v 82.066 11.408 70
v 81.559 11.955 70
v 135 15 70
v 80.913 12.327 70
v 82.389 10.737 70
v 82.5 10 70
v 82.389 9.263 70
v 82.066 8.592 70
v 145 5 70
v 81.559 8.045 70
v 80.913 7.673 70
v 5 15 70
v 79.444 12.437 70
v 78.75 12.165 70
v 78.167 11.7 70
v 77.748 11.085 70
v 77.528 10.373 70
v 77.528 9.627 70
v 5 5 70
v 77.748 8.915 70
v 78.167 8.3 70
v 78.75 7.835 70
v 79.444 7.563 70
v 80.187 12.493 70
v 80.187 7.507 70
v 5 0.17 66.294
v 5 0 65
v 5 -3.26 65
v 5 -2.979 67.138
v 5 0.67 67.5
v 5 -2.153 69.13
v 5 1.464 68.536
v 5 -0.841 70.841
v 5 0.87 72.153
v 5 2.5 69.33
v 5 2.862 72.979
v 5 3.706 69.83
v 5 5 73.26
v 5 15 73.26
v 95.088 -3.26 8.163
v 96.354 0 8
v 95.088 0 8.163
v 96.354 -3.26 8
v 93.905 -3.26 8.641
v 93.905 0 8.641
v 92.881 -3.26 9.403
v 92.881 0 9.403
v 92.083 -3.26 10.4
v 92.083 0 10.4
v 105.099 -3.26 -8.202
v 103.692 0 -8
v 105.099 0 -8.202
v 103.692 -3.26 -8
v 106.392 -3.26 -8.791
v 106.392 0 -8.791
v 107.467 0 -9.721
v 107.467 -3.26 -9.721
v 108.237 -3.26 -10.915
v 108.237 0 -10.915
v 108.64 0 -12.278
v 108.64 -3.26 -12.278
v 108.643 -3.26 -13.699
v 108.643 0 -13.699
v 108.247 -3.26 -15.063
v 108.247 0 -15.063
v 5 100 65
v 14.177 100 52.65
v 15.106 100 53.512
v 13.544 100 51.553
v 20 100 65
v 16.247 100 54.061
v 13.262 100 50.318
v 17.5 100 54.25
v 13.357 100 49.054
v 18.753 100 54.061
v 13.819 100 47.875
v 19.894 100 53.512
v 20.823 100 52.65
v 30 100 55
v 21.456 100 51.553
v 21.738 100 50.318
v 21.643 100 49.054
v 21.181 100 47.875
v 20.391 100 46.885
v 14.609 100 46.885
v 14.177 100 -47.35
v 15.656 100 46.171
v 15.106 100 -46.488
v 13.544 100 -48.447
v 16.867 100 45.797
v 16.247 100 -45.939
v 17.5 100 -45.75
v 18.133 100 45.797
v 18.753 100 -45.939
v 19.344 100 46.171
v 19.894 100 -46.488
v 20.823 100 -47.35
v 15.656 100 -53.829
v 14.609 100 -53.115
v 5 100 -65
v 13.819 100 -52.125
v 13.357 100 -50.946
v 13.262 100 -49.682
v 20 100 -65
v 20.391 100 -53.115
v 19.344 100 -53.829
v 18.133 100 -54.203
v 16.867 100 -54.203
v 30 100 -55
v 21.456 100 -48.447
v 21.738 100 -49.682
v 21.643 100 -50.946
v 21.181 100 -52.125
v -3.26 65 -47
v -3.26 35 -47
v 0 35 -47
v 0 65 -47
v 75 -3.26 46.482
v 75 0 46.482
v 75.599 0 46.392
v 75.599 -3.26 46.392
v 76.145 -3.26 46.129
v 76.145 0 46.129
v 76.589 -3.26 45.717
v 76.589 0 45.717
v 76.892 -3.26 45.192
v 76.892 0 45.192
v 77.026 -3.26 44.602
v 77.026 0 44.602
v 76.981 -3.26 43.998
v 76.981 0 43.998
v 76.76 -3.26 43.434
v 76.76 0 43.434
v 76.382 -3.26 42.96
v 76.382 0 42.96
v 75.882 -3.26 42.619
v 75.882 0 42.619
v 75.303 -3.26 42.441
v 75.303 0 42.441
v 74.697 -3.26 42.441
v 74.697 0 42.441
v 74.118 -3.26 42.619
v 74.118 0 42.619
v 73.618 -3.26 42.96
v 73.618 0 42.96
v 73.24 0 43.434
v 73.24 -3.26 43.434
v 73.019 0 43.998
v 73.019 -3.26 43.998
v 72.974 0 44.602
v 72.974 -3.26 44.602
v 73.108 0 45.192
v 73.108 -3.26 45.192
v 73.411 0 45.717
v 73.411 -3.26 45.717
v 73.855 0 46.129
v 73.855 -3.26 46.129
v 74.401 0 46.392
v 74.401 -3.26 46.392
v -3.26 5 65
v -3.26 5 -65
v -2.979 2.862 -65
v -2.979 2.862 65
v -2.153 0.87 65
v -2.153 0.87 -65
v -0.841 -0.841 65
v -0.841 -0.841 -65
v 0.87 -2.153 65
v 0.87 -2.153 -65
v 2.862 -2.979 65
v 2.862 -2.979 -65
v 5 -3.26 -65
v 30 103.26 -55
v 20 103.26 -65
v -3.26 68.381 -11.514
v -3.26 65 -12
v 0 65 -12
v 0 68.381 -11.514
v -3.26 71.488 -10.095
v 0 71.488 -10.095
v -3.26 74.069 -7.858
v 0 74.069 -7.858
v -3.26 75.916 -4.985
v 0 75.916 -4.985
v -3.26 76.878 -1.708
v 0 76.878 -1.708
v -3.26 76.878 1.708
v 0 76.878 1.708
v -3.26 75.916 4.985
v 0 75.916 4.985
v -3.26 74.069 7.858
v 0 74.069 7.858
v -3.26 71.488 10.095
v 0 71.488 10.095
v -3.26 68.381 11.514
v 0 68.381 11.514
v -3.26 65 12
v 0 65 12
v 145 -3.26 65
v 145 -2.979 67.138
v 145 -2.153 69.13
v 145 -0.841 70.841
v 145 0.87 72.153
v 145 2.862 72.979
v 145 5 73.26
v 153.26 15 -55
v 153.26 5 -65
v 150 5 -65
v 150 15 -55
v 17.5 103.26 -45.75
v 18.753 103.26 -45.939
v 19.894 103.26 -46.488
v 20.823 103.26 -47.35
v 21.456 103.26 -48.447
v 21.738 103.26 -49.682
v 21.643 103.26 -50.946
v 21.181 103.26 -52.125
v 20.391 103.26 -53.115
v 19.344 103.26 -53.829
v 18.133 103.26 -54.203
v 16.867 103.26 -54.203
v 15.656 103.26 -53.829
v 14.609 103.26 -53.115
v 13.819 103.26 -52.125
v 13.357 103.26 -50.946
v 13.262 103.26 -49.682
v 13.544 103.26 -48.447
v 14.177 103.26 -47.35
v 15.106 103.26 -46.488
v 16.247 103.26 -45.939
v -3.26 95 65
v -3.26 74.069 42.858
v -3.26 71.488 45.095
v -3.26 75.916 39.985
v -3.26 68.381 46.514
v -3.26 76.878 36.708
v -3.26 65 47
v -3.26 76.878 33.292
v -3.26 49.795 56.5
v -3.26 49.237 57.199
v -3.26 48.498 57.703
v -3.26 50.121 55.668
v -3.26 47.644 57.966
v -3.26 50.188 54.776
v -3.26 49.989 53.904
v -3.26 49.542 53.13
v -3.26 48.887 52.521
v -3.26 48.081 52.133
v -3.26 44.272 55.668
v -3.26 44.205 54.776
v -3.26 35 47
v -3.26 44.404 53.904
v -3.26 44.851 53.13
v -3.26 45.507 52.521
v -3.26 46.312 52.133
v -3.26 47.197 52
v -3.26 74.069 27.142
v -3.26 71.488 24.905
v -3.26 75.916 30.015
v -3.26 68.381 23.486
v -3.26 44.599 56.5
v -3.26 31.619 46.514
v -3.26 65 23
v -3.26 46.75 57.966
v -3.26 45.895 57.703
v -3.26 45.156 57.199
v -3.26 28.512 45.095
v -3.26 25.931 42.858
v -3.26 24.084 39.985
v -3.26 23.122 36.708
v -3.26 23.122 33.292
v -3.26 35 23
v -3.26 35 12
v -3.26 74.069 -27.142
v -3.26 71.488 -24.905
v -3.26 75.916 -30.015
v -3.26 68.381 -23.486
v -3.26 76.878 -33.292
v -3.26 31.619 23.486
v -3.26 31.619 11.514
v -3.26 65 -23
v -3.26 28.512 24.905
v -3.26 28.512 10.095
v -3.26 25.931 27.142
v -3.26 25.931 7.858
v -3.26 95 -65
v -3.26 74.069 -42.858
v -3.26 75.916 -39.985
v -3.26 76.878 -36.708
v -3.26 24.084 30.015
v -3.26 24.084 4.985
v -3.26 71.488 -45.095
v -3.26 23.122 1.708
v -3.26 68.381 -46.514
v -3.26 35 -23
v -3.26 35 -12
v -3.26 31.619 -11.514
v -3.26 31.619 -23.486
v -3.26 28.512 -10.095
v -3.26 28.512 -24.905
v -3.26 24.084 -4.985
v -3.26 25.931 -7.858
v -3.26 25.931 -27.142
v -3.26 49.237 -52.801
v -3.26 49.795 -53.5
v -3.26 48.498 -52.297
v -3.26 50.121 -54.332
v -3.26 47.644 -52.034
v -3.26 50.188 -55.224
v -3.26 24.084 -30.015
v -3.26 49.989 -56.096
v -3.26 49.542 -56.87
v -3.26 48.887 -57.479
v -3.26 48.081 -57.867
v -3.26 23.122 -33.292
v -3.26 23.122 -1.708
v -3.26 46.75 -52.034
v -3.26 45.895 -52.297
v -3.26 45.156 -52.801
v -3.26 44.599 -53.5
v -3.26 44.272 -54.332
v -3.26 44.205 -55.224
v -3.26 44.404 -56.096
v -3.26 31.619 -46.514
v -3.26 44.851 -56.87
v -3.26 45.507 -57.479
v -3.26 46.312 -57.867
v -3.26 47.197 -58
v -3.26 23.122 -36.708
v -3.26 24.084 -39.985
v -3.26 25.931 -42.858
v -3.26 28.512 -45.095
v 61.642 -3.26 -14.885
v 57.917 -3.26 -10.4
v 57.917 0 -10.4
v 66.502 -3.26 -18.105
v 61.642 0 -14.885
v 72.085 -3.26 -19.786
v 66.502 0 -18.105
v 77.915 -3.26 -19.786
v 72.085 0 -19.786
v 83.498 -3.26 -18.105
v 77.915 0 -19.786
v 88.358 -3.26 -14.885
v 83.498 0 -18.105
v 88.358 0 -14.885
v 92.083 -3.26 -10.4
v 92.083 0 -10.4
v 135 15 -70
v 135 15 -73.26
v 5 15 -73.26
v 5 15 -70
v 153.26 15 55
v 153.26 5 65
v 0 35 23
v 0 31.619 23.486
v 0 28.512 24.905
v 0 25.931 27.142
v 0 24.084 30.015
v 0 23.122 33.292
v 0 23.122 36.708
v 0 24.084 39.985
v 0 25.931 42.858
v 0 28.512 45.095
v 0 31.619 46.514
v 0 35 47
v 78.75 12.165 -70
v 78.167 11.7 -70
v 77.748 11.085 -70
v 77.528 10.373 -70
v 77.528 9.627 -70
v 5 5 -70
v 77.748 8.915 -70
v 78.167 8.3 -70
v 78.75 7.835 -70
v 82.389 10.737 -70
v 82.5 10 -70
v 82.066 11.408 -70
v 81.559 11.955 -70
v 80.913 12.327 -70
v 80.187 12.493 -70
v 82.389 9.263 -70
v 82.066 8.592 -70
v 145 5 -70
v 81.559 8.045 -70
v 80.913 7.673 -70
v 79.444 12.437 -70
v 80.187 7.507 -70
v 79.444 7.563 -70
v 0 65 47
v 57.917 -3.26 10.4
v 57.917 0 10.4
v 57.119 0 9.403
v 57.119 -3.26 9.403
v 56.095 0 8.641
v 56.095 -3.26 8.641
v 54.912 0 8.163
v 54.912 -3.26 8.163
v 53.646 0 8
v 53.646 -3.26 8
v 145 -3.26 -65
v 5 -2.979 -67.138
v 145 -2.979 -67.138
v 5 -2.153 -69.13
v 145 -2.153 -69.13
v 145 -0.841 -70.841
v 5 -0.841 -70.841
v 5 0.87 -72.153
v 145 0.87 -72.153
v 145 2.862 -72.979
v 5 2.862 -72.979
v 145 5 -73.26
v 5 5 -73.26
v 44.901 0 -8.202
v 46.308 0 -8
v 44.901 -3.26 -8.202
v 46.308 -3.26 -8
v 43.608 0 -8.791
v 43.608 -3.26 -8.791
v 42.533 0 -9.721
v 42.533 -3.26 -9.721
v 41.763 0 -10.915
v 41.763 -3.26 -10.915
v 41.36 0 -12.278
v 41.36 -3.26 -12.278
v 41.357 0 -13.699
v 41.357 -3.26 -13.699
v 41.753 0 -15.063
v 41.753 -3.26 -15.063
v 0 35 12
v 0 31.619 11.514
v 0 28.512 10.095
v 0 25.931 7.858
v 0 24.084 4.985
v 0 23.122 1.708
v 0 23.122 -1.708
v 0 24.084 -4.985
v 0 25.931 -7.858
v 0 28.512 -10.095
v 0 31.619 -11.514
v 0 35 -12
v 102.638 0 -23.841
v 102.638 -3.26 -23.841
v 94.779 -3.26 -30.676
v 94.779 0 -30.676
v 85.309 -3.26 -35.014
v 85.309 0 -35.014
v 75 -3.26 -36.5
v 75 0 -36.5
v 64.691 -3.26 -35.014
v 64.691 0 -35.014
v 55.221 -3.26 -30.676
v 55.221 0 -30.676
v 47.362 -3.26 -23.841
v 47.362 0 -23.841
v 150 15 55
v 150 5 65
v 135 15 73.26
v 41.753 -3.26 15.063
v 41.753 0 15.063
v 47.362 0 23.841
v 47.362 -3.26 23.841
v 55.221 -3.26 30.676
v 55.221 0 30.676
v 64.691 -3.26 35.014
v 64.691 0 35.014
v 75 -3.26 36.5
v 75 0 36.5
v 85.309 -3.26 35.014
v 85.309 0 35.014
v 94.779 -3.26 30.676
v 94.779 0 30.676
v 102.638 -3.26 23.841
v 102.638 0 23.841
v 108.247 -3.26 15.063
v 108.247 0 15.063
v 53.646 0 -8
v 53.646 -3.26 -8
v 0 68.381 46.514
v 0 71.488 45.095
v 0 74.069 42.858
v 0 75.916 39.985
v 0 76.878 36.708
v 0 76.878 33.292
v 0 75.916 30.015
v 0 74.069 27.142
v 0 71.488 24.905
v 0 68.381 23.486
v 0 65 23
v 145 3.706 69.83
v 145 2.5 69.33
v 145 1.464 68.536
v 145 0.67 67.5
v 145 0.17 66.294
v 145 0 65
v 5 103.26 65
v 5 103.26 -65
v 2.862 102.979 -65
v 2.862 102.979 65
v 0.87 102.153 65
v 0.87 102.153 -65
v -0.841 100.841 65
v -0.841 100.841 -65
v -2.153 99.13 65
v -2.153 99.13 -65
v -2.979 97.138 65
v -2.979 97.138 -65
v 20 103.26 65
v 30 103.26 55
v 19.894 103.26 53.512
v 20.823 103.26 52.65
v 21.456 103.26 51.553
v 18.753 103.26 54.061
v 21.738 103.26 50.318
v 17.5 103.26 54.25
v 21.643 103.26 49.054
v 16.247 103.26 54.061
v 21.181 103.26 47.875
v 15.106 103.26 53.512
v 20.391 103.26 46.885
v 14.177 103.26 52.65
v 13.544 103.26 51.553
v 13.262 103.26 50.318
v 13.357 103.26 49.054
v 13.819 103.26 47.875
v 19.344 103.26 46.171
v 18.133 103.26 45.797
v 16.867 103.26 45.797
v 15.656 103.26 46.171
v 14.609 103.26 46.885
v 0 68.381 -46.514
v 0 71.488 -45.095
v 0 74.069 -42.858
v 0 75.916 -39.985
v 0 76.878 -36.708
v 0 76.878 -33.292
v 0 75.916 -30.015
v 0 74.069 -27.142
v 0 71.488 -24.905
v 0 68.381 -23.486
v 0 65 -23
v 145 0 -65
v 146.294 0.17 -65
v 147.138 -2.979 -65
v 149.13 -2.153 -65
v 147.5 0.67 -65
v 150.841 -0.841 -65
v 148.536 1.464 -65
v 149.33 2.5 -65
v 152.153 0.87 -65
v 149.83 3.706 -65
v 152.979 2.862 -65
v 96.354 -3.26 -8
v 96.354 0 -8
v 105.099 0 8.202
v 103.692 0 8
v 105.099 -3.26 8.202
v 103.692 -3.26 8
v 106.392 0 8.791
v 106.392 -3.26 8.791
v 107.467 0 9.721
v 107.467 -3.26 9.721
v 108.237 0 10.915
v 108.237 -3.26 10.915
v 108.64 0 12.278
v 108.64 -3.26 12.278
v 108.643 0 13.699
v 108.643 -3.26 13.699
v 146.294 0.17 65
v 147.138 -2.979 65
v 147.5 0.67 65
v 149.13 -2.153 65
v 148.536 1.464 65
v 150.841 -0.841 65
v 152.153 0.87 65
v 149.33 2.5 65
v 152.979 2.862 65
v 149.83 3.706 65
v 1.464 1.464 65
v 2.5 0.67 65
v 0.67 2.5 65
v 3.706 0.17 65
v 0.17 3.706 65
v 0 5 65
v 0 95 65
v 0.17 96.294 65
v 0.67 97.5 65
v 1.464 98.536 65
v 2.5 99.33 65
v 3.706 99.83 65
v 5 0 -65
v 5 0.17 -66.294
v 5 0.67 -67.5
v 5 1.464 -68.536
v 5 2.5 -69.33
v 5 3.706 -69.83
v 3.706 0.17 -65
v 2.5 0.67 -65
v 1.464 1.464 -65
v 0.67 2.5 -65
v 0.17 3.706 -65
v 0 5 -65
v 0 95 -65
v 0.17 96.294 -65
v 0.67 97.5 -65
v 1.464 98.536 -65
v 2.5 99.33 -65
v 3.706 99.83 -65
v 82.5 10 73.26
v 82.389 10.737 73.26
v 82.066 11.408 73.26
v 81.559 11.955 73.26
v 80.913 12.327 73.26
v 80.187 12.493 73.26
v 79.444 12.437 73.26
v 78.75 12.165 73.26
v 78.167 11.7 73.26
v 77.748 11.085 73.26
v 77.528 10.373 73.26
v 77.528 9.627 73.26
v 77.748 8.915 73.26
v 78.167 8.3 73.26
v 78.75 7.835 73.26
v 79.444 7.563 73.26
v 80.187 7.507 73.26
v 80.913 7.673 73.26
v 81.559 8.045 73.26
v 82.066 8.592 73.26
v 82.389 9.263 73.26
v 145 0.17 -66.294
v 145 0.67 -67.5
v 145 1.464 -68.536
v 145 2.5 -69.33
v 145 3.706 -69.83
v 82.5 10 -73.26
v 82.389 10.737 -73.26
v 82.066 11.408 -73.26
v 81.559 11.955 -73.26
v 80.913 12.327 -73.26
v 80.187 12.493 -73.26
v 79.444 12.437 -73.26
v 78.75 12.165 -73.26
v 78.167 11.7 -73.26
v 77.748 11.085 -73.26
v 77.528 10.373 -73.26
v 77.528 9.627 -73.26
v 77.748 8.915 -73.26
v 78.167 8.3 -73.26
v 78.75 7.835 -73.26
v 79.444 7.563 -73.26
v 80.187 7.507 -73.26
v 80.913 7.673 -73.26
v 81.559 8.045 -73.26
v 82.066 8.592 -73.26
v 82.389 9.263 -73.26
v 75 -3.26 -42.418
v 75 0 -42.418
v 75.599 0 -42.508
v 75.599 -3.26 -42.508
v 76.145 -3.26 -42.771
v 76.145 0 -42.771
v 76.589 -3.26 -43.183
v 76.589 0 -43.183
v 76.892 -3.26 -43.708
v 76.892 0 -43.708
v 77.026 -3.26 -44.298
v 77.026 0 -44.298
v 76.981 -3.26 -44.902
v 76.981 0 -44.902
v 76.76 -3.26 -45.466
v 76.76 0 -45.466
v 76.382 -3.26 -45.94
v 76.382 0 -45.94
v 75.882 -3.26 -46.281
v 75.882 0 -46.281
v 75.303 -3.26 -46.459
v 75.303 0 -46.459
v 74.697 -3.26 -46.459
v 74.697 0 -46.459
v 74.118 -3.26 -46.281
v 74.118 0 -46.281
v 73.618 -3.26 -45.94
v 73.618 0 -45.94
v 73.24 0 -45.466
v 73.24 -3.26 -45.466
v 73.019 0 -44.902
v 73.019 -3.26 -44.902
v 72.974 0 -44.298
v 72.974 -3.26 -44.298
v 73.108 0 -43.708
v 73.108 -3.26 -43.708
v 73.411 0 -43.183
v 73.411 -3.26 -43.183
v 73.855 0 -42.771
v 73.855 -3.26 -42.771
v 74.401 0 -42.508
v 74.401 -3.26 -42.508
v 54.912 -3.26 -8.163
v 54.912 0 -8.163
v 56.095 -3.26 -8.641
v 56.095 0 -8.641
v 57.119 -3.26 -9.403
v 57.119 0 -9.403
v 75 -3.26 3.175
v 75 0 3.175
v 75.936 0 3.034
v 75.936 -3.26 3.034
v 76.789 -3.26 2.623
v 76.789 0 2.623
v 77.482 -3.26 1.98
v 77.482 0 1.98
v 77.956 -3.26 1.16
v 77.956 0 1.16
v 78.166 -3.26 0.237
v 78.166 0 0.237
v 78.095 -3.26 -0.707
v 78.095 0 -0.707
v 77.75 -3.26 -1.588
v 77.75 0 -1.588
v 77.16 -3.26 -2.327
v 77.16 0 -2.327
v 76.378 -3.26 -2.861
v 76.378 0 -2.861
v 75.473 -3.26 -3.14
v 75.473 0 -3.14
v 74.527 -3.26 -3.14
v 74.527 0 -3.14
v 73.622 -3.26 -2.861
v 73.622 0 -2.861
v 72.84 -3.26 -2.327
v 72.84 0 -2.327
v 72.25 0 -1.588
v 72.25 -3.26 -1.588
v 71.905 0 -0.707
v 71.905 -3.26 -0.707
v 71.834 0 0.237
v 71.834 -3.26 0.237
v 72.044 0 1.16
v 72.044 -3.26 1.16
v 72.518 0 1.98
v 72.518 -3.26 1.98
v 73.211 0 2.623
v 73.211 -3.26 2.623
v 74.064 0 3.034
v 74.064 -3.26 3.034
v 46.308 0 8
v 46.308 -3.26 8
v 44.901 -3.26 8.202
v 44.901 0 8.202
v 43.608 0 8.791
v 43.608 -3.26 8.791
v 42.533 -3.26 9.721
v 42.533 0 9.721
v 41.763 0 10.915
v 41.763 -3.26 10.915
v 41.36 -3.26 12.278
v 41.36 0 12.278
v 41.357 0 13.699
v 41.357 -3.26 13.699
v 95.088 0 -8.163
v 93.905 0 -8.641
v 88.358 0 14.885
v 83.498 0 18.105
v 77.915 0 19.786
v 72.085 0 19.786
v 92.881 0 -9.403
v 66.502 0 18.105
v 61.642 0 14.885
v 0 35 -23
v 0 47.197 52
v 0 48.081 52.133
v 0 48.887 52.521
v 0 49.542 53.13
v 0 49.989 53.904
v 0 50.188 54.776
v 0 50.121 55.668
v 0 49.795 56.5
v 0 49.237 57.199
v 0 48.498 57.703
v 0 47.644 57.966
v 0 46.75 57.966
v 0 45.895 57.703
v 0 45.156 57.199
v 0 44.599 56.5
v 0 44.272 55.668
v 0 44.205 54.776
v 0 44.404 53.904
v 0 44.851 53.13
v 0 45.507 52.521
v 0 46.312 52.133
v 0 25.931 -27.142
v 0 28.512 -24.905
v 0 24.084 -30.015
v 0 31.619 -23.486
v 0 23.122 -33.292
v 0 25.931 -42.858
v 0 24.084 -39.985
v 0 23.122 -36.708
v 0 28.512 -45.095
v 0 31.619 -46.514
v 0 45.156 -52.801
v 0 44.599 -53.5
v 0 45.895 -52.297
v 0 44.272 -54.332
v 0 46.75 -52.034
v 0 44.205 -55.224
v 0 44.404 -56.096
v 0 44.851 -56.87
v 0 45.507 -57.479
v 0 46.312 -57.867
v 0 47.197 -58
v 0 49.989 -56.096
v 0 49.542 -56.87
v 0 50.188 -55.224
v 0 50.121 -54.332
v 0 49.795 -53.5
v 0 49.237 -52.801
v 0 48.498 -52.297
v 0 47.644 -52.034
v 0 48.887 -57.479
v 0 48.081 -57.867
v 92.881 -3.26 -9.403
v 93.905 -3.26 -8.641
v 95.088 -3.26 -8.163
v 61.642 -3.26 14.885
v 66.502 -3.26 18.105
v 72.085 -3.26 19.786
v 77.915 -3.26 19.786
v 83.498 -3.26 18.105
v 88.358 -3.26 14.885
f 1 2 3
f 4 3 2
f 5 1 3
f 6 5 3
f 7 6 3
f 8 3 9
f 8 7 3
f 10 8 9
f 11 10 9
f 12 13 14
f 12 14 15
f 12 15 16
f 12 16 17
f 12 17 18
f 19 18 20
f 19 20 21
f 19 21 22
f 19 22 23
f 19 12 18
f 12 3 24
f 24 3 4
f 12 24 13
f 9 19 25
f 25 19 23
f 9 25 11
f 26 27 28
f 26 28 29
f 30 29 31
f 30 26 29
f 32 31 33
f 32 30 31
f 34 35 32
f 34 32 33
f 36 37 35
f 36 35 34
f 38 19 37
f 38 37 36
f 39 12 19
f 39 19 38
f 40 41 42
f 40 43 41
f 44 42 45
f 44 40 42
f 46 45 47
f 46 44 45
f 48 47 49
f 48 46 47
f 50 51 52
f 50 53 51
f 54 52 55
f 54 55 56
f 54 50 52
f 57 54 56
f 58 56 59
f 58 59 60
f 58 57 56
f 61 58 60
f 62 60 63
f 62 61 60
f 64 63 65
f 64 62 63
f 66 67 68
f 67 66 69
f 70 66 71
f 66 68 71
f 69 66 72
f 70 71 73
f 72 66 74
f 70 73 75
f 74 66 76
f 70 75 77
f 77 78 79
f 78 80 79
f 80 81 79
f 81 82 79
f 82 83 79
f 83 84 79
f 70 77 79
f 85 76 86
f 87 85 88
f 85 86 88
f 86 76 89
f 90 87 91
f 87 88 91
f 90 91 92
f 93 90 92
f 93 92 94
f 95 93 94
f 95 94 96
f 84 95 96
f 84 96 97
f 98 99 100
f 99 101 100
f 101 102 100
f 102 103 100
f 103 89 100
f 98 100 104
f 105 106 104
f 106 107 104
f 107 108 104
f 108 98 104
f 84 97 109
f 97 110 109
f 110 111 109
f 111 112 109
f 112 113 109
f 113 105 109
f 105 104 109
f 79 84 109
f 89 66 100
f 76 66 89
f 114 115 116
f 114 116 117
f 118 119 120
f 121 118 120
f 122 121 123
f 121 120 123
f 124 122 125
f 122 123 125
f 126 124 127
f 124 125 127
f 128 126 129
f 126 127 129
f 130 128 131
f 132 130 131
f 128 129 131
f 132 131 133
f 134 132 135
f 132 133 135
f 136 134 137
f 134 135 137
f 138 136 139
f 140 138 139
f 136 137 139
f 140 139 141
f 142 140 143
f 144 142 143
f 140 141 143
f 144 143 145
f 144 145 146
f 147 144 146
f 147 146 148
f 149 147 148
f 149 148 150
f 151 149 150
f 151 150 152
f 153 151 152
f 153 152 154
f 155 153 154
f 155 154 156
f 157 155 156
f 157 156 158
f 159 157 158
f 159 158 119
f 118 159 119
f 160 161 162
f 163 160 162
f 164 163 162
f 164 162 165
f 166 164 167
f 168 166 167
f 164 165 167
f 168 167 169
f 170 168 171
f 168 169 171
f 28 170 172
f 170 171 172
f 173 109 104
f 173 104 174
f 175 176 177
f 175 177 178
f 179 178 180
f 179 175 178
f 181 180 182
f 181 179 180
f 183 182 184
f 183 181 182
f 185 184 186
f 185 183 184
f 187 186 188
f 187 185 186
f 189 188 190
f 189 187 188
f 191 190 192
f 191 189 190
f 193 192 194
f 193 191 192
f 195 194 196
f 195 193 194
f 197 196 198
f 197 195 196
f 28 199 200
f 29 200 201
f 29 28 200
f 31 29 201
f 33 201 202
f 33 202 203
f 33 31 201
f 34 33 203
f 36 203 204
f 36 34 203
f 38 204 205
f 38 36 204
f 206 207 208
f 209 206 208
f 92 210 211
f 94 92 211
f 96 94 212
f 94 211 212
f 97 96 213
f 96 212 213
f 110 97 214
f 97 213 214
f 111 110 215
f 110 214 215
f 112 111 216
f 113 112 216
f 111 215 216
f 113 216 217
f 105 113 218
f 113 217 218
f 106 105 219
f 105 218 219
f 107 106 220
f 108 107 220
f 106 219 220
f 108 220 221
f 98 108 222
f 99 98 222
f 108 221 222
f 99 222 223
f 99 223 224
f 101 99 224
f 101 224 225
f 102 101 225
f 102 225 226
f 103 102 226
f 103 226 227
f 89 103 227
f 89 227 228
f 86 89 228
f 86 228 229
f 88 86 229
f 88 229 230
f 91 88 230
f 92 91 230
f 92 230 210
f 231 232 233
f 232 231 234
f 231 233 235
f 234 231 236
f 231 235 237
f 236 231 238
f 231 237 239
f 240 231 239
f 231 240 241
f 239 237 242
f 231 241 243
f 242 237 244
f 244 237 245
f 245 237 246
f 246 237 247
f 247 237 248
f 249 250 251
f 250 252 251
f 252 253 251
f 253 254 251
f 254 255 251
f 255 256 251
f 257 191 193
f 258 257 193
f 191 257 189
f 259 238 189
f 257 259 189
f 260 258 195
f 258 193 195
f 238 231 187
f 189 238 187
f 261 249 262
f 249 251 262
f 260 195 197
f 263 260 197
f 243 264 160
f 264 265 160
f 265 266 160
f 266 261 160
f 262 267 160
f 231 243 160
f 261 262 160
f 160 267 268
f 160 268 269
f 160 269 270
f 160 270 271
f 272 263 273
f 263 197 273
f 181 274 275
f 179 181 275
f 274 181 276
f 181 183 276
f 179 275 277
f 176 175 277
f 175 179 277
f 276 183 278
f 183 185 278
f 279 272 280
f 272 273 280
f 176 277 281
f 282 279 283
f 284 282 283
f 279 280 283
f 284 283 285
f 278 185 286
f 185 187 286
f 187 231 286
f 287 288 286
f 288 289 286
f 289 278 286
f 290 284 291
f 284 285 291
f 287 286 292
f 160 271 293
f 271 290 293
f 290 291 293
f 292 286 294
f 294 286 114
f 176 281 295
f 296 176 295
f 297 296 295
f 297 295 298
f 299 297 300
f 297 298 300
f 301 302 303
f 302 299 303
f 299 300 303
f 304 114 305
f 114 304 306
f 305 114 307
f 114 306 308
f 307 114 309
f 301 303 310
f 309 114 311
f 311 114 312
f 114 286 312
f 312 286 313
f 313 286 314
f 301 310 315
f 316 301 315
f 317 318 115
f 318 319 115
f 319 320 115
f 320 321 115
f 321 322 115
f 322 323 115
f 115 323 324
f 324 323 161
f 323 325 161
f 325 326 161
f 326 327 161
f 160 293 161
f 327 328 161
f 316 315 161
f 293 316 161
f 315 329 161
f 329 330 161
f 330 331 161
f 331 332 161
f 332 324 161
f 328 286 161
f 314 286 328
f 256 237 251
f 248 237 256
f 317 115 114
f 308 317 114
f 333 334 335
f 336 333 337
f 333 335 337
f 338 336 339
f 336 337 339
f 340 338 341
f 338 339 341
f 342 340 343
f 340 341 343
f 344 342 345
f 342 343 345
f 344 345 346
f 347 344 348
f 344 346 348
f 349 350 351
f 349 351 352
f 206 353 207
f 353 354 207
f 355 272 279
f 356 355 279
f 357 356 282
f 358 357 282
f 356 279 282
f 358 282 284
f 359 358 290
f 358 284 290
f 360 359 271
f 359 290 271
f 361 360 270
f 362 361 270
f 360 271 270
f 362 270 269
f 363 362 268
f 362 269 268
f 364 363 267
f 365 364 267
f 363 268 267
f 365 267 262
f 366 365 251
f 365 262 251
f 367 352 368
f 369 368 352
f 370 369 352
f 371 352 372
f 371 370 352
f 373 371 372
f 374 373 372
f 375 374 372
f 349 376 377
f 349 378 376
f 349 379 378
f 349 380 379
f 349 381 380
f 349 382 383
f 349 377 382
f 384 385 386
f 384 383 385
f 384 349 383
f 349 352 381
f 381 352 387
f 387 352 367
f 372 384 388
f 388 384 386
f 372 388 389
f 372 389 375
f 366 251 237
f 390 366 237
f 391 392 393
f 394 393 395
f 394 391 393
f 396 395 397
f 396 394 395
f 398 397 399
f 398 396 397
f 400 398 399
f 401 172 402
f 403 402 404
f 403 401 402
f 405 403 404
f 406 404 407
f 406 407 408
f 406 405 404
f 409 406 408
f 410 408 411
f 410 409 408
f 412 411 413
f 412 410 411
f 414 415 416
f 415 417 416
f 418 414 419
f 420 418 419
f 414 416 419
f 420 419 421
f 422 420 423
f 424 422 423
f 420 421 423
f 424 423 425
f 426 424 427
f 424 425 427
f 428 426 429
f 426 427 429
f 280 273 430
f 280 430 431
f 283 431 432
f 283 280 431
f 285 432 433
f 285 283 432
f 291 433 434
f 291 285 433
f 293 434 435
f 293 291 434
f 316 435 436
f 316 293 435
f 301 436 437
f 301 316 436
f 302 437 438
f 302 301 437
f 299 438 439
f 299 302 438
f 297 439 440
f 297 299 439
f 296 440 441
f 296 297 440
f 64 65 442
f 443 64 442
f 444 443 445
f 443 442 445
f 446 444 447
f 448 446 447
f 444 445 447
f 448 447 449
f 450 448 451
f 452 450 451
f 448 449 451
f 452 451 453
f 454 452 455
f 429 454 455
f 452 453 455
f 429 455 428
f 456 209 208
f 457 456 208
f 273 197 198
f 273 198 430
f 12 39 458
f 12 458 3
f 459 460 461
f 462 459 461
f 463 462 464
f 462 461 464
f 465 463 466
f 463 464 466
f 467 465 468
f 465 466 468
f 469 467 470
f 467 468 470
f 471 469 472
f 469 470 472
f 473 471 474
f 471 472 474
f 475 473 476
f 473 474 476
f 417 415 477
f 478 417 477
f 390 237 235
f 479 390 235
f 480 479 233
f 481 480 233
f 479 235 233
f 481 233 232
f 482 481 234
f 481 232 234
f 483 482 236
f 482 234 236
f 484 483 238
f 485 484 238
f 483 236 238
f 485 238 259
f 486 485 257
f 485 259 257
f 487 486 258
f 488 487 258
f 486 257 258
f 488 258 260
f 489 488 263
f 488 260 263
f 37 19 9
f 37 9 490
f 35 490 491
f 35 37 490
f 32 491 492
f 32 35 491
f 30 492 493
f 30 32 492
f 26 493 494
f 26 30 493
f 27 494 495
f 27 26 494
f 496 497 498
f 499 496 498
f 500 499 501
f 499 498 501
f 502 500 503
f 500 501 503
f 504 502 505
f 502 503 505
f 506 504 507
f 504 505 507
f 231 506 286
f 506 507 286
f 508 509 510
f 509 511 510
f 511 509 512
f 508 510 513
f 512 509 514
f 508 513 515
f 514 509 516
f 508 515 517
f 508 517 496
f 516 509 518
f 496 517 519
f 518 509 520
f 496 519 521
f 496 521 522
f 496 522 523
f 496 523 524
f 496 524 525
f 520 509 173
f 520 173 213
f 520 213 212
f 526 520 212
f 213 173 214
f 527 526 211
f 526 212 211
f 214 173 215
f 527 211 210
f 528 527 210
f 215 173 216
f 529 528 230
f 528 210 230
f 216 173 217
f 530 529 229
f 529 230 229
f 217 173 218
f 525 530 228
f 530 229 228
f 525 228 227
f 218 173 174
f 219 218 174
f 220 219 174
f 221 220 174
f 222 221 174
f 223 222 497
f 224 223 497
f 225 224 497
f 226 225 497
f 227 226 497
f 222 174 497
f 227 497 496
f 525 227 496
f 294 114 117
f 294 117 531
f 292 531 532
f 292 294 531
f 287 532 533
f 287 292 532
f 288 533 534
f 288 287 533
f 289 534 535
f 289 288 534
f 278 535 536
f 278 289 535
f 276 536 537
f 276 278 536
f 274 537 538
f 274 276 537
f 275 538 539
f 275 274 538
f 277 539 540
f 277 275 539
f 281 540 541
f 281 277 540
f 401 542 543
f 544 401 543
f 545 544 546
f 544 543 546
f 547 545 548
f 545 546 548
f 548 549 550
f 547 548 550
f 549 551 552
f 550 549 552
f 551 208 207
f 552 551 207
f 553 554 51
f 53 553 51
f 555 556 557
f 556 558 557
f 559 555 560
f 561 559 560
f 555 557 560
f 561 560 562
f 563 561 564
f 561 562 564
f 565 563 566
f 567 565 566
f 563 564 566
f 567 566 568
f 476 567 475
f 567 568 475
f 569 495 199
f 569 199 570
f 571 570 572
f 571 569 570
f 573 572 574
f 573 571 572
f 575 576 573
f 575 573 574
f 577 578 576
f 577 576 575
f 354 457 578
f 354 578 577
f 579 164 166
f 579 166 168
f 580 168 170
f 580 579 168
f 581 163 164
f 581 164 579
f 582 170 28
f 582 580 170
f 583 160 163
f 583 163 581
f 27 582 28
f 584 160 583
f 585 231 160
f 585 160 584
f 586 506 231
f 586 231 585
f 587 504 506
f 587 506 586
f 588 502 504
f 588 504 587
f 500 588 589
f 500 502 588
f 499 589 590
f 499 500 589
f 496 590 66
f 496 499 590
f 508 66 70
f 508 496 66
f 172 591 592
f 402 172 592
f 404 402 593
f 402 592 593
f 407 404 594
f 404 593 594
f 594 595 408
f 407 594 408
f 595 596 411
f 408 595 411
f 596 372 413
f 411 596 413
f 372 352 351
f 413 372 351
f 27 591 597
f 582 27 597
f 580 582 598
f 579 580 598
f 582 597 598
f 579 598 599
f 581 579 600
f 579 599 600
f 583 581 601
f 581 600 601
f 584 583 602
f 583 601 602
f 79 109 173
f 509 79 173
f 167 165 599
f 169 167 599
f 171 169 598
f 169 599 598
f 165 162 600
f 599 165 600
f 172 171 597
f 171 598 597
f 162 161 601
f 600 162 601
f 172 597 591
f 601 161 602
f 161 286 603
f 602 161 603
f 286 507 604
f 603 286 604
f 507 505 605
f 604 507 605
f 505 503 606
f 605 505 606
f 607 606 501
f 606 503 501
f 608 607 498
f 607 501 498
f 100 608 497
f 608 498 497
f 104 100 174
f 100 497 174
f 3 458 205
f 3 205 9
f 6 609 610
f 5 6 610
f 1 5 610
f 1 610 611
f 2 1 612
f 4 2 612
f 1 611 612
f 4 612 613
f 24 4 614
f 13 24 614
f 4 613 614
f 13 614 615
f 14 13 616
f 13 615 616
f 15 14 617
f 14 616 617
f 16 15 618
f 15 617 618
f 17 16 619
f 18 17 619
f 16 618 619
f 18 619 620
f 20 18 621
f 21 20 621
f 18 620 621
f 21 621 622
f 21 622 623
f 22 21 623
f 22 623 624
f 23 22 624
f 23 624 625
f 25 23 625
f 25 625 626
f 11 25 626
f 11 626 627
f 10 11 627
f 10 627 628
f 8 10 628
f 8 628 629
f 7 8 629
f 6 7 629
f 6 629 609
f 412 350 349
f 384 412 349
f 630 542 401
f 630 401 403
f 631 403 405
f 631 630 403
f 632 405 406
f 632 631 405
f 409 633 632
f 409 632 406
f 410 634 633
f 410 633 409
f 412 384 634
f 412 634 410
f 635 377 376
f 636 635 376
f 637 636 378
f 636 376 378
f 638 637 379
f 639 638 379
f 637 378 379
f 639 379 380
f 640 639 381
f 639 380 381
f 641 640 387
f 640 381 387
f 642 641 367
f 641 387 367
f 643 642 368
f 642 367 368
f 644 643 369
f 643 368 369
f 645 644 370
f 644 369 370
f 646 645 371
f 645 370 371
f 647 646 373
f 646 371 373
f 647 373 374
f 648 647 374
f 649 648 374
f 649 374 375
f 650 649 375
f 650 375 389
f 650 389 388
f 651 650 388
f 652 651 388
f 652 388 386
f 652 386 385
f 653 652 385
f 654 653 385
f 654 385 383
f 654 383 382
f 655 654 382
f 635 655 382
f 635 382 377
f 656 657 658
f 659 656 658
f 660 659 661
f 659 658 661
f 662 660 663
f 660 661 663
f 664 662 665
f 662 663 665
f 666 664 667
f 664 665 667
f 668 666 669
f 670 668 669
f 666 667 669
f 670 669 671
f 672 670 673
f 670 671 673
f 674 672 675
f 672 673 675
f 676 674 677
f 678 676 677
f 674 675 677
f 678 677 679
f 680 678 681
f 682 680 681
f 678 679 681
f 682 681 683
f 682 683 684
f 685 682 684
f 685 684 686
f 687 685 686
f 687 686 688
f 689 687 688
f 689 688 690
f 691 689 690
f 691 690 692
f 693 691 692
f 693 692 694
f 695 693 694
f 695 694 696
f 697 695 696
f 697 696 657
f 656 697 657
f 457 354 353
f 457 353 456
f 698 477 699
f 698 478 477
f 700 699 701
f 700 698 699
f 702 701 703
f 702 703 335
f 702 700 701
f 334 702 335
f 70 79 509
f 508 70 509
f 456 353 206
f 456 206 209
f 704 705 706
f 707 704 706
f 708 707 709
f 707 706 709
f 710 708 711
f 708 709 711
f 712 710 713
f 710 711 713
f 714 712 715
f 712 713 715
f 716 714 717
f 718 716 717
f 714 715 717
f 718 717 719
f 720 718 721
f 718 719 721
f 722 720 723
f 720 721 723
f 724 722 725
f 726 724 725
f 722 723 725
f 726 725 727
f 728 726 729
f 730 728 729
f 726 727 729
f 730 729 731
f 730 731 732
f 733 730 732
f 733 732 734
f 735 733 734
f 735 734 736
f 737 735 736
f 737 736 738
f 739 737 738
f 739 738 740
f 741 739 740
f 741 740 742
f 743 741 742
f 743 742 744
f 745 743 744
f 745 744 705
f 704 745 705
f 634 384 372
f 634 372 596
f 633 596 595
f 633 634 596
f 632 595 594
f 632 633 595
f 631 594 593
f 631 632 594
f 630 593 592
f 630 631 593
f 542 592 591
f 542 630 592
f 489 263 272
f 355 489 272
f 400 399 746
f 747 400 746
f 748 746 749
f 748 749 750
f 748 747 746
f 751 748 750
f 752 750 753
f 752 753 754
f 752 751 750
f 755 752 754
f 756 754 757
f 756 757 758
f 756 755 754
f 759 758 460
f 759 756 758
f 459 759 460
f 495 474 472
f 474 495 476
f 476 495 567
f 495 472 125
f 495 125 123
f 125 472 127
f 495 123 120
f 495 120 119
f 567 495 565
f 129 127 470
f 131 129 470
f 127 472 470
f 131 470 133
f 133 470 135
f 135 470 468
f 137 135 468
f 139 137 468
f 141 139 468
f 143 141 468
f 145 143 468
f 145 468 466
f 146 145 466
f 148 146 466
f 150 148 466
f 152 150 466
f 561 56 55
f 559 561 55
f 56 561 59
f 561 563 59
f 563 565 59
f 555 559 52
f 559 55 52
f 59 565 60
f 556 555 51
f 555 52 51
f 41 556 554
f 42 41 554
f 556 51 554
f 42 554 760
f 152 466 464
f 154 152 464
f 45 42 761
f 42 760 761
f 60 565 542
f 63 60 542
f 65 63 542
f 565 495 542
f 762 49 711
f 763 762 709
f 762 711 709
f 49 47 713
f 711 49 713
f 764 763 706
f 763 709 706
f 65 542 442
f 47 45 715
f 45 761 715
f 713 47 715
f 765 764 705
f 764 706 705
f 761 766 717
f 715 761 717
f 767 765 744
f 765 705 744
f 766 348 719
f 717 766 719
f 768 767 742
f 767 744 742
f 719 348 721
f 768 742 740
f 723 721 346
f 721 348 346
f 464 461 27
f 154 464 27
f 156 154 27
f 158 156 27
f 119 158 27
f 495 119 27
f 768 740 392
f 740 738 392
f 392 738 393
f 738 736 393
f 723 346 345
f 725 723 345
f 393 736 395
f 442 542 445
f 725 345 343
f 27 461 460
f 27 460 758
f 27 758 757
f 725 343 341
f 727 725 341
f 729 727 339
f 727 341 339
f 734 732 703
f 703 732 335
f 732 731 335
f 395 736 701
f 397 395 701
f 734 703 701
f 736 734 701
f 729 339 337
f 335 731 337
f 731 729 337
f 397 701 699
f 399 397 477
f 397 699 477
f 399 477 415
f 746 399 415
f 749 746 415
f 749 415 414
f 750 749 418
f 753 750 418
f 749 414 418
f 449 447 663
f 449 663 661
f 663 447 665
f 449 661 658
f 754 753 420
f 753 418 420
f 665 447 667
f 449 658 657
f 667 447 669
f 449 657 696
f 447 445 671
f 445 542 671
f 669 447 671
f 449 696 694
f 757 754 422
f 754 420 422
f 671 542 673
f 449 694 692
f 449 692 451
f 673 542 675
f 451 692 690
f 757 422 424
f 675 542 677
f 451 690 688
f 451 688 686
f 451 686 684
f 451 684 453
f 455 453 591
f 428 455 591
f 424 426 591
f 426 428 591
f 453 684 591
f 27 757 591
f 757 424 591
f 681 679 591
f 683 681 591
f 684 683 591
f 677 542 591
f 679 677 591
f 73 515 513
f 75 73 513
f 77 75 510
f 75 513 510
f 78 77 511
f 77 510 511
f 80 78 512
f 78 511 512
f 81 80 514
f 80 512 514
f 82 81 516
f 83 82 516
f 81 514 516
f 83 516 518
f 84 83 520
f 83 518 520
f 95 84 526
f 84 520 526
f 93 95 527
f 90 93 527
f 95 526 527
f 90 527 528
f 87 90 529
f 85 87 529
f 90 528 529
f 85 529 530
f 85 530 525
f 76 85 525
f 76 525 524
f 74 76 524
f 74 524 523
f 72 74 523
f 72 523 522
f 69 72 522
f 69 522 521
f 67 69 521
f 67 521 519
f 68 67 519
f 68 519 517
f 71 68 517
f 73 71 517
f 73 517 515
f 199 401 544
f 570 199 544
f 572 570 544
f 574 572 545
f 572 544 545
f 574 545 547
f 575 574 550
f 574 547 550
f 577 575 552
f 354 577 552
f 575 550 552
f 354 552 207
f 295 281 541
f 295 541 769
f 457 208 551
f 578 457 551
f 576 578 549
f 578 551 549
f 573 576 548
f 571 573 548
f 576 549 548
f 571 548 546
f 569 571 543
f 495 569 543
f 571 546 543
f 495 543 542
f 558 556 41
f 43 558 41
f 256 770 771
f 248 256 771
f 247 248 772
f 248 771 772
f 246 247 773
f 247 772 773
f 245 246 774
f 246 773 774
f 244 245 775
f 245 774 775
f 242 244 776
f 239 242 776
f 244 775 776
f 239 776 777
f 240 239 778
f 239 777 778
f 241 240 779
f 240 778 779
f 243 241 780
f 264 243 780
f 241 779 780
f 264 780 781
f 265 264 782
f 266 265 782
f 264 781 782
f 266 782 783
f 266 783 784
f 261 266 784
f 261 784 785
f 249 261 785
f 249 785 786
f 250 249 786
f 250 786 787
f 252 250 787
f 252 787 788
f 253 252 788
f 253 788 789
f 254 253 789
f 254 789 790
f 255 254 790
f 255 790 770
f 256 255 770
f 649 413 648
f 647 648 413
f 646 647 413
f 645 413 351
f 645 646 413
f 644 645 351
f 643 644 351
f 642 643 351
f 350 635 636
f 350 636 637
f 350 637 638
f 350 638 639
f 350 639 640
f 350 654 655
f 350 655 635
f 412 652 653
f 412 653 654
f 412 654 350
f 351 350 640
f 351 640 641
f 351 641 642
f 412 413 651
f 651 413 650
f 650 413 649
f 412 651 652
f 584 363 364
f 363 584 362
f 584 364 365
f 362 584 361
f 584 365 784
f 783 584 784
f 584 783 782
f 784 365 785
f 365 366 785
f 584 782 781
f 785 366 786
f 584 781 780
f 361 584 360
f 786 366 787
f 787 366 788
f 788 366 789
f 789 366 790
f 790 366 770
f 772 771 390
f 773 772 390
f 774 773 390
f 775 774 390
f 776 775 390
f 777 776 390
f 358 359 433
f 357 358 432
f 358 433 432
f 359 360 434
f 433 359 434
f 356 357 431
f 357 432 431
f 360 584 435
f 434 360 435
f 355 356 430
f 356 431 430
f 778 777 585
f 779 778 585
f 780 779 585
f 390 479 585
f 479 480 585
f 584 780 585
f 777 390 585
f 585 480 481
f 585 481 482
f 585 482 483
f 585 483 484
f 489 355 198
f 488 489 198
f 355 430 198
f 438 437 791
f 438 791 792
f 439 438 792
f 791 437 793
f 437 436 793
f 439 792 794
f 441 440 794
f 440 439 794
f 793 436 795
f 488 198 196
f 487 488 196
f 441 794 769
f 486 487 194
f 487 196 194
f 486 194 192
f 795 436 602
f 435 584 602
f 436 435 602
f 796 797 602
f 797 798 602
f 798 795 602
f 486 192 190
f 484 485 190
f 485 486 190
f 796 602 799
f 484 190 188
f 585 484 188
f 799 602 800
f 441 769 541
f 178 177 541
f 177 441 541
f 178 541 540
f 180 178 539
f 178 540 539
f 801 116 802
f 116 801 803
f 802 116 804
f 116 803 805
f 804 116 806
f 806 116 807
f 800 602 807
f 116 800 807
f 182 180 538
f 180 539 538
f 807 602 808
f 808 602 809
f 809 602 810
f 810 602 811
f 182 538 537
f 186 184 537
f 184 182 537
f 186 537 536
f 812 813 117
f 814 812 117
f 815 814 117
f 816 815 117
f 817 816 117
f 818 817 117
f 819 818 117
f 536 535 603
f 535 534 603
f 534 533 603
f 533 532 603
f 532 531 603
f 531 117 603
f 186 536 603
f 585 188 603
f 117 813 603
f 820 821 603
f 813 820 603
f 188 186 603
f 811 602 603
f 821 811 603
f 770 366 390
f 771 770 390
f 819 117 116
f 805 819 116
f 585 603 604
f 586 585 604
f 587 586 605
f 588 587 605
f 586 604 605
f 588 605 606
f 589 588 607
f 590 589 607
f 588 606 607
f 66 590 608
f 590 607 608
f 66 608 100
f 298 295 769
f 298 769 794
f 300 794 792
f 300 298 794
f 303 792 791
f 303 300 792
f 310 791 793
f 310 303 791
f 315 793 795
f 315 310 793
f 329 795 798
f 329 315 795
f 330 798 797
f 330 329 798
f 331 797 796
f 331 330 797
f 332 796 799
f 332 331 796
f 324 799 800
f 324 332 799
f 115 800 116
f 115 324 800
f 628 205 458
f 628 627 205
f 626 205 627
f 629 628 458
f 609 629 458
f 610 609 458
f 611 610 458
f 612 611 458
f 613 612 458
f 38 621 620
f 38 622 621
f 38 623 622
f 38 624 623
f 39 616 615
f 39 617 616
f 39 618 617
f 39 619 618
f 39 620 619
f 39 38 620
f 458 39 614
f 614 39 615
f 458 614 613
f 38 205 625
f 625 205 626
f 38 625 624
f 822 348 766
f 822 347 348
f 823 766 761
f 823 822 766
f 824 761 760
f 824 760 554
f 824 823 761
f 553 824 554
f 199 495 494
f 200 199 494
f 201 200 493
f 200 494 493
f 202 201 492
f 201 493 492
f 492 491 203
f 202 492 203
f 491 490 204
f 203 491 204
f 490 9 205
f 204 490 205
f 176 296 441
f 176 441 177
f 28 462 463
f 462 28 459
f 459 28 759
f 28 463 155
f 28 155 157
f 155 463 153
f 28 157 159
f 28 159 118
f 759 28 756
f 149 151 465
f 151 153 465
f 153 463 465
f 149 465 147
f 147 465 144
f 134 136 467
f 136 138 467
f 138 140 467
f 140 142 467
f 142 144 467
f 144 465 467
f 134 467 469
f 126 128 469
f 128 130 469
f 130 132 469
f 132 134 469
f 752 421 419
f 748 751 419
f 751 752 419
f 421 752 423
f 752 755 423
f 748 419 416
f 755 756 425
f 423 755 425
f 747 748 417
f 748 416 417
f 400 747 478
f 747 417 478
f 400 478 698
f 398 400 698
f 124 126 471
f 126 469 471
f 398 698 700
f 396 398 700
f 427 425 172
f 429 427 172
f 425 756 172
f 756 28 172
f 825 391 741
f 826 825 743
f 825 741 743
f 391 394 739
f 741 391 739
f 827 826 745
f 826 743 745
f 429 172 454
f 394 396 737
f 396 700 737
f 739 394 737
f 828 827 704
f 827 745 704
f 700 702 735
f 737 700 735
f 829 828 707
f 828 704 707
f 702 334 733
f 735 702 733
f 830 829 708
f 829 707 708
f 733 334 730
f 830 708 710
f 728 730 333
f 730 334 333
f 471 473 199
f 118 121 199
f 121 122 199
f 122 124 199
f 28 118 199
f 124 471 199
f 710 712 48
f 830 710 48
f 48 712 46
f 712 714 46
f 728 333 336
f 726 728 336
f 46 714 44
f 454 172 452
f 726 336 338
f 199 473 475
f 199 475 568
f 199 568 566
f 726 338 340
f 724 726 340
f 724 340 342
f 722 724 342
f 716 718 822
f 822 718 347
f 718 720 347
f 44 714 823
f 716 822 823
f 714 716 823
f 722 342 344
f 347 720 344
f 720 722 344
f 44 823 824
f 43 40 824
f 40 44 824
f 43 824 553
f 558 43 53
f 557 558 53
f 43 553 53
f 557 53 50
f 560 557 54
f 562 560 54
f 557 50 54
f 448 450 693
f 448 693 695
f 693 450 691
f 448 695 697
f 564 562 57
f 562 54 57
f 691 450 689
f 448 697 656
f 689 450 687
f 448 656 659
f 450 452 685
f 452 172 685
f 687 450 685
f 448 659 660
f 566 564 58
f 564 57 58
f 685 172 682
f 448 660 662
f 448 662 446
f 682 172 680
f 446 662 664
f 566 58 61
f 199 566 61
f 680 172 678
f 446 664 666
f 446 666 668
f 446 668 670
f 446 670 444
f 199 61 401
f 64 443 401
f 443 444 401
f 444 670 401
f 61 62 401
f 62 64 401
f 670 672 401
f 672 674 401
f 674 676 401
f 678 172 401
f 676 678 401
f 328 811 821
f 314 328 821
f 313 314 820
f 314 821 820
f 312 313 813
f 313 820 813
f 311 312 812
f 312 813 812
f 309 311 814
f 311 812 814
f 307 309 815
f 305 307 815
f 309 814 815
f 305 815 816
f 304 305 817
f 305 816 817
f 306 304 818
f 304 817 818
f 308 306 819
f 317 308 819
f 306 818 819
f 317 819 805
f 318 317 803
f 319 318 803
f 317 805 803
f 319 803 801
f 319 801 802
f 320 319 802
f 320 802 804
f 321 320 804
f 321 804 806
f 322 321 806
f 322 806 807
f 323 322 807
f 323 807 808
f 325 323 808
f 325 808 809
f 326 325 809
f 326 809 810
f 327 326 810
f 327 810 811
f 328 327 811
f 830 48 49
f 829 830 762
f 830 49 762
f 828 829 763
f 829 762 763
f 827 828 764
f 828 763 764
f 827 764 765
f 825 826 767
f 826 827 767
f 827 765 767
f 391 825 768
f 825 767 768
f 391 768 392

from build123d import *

# Parameters (mm, degrees)
BASE_FLANGE1_START      = -65
BASE_FLANGE1_DEPTH      = 130
CUT_EXTRUDE1_DEPTH      = 10
SKETCH4_R               = 4.25
CUT_EXTRUDE2_DEPTH      = 10
SKETCH5_R               = 3.175
SKETCH5_R_2             = 2.032
CUT_EXTRUDE3_DEPTH      = 10
CUT_EXTRUDE4_DEPTH      = 10
CHAMFER1_SIZE           = 10
EDGE_FLANGE1_DEPTH      = 140
EDGE_FLANGE1_BEND_DEPTH = 140
FILLET1_R               = 5
CHAMFER2_SIZE           = 10
SKETCH13_R              = 3
CUT_EXTRUDE5_DEPTH      = 10
SKETCH14_R              = 2.5
CUT_EXTRUDE6_DEPTH      = 236.837583095


# Read off the part's stored shape, not the designer's step: Base-Flange1
# Sheet-metal steps are written as plain solids
with BuildPart() as part:
    # Base-Flange1 outline → Base-Flange1 (new body)
    with BuildSketch(Plane.XY.offset(BASE_FLANGE1_START)):
        with BuildLine():
            Line((153.26, 5), (153.26, 15))
            Line((153.26, 15), (150, 15))
            Line((150, 15), (150, 5))
            ThreePointArc((150, 5), (148.535533906, 1.464466094), (145, 0))
            Line((145, 0), (5, 0))
            ThreePointArc((5, 0), (1.464466094, 1.464466094), (0, 5))
            Line((0, 5), (0, 95))
            ThreePointArc((0, 95), (1.464466094, 98.535533906), (5, 100))
            Line((5, 100), (30, 100))
            Line((30, 100), (30, 103.26))
            Line((30, 103.26), (5, 103.26))
            ThreePointArc((5, 103.26), (-0.840702013, 100.840702013), (-3.26, 95))
            Line((-3.26, 95), (-3.26, 5))
            ThreePointArc((-3.26, 5), (-0.840702013, -0.840702013), (5, -3.26))
            Line((5, -3.26), (145, -3.26))
            ThreePointArc((145, -3.26), (150.840702013, -0.840702013), (153.26, 5))
        make_face()
    extrude(amount=BASE_FLANGE1_DEPTH)

    # Sketch3 → Cut-Extrude1 (cut)
    with BuildSketch(Plane.ZY.offset(3.26)):
        with BuildLine():
            Line((-47, 35), (-47, 65))
            ThreePointArc((-47, 65), (-35, 77), (-23, 65))
            Line((-23, 65), (-23, 35))
            ThreePointArc((-23, 35), (-35, 23), (-47, 35))
        make_face()
        with BuildLine():
            Line((47, 35), (47, 65))
            ThreePointArc((47, 65), (35, 77), (23, 65))
            Line((23, 65), (23, 35))
            ThreePointArc((23, 35), (35, 23), (47, 35))
        make_face()
        with BuildLine():
            Line((12, 65), (12, 35))
            ThreePointArc((12, 35), (0, 23), (-12, 35))
            Line((-12, 35), (-12, 65))
            ThreePointArc((-12, 65), (0, 77), (12, 65))
        make_face()
    extrude(amount=-CUT_EXTRUDE1_DEPTH, mode=Mode.SUBTRACT)

    # Sketch4 → Cut-Extrude2 (cut)
    with BuildSketch(Plane(origin=(0, 103.26, 0), x_dir=(1, 0, 0), z_dir=(0, 1, 0))):
        with Locations(Location((17.5, 50, 0), (0, 0, 270))):
            Circle(SKETCH4_R)
        with Locations(Location((17.5, -50, 0), (0, 0, 270))):
            Circle(SKETCH4_R)
    extrude(amount=-CUT_EXTRUDE2_DEPTH, mode=Mode.SUBTRACT)

    # Sketch5 → Cut-Extrude3 (cut)
    with BuildSketch(Plane(origin=(0, 0, 0), x_dir=(1, 0, 0), z_dir=(0, 1, 0))):
        with Locations(Location((75, 0, 0), (0, 0, 270))):
            Circle(SKETCH5_R)
        with Locations(Location((75, 44.45, 0), (0, 0, 270))):
            Circle(SKETCH5_R_2)
        with Locations(Location((75, -44.45, 0), (0, 0, 270))):
            Circle(SKETCH5_R_2)
    extrude(amount=-CUT_EXTRUDE3_DEPTH, mode=Mode.SUBTRACT)

    # Sketch6 → Cut-Extrude4 (cut)
    with BuildSketch(Plane(origin=(0, 0, 0), x_dir=(1, 0, 0), z_dir=(0, 1, 0))):
        with BuildLine():
            Line((39.387502194, 8), (56.66969722, 8))
            ThreePointArc((56.66969722, 8), (75, 20), (93.33030278, 8))
            Line((93.33030278, 8), (110.612497806, 8))
            ThreePointArc((110.612497806, 8), (75, 36.5), (39.387502194, 8))
        make_face()
        with BuildLine():
            Line((110.612497806, -8), (93.33030278, -8))
            ThreePointArc((93.33030278, -8), (75, -20), (56.66969722, -8))
            Line((56.66969722, -8), (39.387502194, -8))
            ThreePointArc((39.387502194, -8), (75, -36.5), (110.612497806, -8))
        make_face()
    extrude(amount=-CUT_EXTRUDE4_DEPTH, mode=Mode.SUBTRACT)

    # Chamfer1
    chamfer1_edges = [part.edges().sort_by_distance(p)[0] for p in [
        (151.63, 15, -65),
        (151.63, 15, 65),
        (30, 101.63, -65),
        (30, 101.63, 65),
    ]]
    chamfer(chamfer1_edges, length=CHAMFER1_SIZE)

    # Edge-Flange1 section (across the edge) → Edge-Flange1 (add)
    with BuildSketch(Plane(origin=(5, 0, 70), x_dir=(0, 0, -1), z_dir=(1, 0, 0))):
        with BuildLine():
            Line((-3.26, 5), (-3.26, 15))
            Line((-3.26, 15), (0, 15))
            Line((0, 15), (0, 5))
            ThreePointArc((0, 5), (1.464466094, 1.464466094), (5, 0))
            Line((5, 0), (5, -3.26))
            ThreePointArc((5, -3.26), (-0.840702013, -0.840702013), (-3.26, 5))
        make_face()
    extrude(amount=EDGE_FLANGE1_DEPTH)

    # Edge-Flange1 section 2 (across the edge) → Edge-Flange1 bend (add)
    with BuildSketch(Plane(origin=(145, 0, -70), x_dir=(0, 0, 1), z_dir=(-1, 0, 0))):
        with BuildLine():
            Line((-3.26, 5), (-3.26, 15))
            Line((-3.26, 15), (0, 15))
            Line((0, 15), (0, 5))
            ThreePointArc((0, 5), (1.464466094, 1.464466094), (5, 0))
            Line((5, 0), (5, -3.26))
            ThreePointArc((5, -3.26), (-0.840702013, -0.840702013), (-3.26, 5))
        make_face()
    extrude(amount=EDGE_FLANGE1_BEND_DEPTH)

    # Fillet1
    fillet1_edges = [part.edges().sort_by_distance(p)[0] for p in [
        (56.66969722, -1.63, 8),
        (93.33030278, -1.63, 8),
        (110.612497806, -1.63, 8),
        (39.387502194, -1.63, 8),
        (93.33030278, -1.63, -8),
        (56.66969722, -1.63, -8),
        (39.387502194, -1.63, -8),
        (110.612497806, -1.63, -8),
    ]]
    fillet(fillet1_edges, radius=FILLET1_R)

    # Chamfer2
    chamfer2_edges = [part.edges().sort_by_distance(p)[0] for p in [
        (145, 15, -71.63),
        (145, 15, 71.63),
    ]]
    chamfer(chamfer2_edges, length=CHAMFER2_SIZE)

    # Sketch13 → Cut-Extrude5 (cut)
    with BuildSketch(Plane(origin=(0, 0, 0), x_dir=(0, 0, -1), z_dir=(1, 0, 0))):
        with Locations((-55, 47.196639222)):
            Circle(SKETCH13_R)
        with Locations((55, 47.196639222)):
            Circle(SKETCH13_R)
    extrude(amount=-CUT_EXTRUDE5_DEPTH, mode=Mode.SUBTRACT)

    # Sketch14 → Cut-Extrude6 (cut, through all)
    with BuildSketch(Plane.XY.offset(73.26)):
        with Locations((80, 10)):
            Circle(SKETCH14_R)
    extrude(amount=-CUT_EXTRUDE6_DEPTH, mode=Mode.SUBTRACT)


solid = part.part
